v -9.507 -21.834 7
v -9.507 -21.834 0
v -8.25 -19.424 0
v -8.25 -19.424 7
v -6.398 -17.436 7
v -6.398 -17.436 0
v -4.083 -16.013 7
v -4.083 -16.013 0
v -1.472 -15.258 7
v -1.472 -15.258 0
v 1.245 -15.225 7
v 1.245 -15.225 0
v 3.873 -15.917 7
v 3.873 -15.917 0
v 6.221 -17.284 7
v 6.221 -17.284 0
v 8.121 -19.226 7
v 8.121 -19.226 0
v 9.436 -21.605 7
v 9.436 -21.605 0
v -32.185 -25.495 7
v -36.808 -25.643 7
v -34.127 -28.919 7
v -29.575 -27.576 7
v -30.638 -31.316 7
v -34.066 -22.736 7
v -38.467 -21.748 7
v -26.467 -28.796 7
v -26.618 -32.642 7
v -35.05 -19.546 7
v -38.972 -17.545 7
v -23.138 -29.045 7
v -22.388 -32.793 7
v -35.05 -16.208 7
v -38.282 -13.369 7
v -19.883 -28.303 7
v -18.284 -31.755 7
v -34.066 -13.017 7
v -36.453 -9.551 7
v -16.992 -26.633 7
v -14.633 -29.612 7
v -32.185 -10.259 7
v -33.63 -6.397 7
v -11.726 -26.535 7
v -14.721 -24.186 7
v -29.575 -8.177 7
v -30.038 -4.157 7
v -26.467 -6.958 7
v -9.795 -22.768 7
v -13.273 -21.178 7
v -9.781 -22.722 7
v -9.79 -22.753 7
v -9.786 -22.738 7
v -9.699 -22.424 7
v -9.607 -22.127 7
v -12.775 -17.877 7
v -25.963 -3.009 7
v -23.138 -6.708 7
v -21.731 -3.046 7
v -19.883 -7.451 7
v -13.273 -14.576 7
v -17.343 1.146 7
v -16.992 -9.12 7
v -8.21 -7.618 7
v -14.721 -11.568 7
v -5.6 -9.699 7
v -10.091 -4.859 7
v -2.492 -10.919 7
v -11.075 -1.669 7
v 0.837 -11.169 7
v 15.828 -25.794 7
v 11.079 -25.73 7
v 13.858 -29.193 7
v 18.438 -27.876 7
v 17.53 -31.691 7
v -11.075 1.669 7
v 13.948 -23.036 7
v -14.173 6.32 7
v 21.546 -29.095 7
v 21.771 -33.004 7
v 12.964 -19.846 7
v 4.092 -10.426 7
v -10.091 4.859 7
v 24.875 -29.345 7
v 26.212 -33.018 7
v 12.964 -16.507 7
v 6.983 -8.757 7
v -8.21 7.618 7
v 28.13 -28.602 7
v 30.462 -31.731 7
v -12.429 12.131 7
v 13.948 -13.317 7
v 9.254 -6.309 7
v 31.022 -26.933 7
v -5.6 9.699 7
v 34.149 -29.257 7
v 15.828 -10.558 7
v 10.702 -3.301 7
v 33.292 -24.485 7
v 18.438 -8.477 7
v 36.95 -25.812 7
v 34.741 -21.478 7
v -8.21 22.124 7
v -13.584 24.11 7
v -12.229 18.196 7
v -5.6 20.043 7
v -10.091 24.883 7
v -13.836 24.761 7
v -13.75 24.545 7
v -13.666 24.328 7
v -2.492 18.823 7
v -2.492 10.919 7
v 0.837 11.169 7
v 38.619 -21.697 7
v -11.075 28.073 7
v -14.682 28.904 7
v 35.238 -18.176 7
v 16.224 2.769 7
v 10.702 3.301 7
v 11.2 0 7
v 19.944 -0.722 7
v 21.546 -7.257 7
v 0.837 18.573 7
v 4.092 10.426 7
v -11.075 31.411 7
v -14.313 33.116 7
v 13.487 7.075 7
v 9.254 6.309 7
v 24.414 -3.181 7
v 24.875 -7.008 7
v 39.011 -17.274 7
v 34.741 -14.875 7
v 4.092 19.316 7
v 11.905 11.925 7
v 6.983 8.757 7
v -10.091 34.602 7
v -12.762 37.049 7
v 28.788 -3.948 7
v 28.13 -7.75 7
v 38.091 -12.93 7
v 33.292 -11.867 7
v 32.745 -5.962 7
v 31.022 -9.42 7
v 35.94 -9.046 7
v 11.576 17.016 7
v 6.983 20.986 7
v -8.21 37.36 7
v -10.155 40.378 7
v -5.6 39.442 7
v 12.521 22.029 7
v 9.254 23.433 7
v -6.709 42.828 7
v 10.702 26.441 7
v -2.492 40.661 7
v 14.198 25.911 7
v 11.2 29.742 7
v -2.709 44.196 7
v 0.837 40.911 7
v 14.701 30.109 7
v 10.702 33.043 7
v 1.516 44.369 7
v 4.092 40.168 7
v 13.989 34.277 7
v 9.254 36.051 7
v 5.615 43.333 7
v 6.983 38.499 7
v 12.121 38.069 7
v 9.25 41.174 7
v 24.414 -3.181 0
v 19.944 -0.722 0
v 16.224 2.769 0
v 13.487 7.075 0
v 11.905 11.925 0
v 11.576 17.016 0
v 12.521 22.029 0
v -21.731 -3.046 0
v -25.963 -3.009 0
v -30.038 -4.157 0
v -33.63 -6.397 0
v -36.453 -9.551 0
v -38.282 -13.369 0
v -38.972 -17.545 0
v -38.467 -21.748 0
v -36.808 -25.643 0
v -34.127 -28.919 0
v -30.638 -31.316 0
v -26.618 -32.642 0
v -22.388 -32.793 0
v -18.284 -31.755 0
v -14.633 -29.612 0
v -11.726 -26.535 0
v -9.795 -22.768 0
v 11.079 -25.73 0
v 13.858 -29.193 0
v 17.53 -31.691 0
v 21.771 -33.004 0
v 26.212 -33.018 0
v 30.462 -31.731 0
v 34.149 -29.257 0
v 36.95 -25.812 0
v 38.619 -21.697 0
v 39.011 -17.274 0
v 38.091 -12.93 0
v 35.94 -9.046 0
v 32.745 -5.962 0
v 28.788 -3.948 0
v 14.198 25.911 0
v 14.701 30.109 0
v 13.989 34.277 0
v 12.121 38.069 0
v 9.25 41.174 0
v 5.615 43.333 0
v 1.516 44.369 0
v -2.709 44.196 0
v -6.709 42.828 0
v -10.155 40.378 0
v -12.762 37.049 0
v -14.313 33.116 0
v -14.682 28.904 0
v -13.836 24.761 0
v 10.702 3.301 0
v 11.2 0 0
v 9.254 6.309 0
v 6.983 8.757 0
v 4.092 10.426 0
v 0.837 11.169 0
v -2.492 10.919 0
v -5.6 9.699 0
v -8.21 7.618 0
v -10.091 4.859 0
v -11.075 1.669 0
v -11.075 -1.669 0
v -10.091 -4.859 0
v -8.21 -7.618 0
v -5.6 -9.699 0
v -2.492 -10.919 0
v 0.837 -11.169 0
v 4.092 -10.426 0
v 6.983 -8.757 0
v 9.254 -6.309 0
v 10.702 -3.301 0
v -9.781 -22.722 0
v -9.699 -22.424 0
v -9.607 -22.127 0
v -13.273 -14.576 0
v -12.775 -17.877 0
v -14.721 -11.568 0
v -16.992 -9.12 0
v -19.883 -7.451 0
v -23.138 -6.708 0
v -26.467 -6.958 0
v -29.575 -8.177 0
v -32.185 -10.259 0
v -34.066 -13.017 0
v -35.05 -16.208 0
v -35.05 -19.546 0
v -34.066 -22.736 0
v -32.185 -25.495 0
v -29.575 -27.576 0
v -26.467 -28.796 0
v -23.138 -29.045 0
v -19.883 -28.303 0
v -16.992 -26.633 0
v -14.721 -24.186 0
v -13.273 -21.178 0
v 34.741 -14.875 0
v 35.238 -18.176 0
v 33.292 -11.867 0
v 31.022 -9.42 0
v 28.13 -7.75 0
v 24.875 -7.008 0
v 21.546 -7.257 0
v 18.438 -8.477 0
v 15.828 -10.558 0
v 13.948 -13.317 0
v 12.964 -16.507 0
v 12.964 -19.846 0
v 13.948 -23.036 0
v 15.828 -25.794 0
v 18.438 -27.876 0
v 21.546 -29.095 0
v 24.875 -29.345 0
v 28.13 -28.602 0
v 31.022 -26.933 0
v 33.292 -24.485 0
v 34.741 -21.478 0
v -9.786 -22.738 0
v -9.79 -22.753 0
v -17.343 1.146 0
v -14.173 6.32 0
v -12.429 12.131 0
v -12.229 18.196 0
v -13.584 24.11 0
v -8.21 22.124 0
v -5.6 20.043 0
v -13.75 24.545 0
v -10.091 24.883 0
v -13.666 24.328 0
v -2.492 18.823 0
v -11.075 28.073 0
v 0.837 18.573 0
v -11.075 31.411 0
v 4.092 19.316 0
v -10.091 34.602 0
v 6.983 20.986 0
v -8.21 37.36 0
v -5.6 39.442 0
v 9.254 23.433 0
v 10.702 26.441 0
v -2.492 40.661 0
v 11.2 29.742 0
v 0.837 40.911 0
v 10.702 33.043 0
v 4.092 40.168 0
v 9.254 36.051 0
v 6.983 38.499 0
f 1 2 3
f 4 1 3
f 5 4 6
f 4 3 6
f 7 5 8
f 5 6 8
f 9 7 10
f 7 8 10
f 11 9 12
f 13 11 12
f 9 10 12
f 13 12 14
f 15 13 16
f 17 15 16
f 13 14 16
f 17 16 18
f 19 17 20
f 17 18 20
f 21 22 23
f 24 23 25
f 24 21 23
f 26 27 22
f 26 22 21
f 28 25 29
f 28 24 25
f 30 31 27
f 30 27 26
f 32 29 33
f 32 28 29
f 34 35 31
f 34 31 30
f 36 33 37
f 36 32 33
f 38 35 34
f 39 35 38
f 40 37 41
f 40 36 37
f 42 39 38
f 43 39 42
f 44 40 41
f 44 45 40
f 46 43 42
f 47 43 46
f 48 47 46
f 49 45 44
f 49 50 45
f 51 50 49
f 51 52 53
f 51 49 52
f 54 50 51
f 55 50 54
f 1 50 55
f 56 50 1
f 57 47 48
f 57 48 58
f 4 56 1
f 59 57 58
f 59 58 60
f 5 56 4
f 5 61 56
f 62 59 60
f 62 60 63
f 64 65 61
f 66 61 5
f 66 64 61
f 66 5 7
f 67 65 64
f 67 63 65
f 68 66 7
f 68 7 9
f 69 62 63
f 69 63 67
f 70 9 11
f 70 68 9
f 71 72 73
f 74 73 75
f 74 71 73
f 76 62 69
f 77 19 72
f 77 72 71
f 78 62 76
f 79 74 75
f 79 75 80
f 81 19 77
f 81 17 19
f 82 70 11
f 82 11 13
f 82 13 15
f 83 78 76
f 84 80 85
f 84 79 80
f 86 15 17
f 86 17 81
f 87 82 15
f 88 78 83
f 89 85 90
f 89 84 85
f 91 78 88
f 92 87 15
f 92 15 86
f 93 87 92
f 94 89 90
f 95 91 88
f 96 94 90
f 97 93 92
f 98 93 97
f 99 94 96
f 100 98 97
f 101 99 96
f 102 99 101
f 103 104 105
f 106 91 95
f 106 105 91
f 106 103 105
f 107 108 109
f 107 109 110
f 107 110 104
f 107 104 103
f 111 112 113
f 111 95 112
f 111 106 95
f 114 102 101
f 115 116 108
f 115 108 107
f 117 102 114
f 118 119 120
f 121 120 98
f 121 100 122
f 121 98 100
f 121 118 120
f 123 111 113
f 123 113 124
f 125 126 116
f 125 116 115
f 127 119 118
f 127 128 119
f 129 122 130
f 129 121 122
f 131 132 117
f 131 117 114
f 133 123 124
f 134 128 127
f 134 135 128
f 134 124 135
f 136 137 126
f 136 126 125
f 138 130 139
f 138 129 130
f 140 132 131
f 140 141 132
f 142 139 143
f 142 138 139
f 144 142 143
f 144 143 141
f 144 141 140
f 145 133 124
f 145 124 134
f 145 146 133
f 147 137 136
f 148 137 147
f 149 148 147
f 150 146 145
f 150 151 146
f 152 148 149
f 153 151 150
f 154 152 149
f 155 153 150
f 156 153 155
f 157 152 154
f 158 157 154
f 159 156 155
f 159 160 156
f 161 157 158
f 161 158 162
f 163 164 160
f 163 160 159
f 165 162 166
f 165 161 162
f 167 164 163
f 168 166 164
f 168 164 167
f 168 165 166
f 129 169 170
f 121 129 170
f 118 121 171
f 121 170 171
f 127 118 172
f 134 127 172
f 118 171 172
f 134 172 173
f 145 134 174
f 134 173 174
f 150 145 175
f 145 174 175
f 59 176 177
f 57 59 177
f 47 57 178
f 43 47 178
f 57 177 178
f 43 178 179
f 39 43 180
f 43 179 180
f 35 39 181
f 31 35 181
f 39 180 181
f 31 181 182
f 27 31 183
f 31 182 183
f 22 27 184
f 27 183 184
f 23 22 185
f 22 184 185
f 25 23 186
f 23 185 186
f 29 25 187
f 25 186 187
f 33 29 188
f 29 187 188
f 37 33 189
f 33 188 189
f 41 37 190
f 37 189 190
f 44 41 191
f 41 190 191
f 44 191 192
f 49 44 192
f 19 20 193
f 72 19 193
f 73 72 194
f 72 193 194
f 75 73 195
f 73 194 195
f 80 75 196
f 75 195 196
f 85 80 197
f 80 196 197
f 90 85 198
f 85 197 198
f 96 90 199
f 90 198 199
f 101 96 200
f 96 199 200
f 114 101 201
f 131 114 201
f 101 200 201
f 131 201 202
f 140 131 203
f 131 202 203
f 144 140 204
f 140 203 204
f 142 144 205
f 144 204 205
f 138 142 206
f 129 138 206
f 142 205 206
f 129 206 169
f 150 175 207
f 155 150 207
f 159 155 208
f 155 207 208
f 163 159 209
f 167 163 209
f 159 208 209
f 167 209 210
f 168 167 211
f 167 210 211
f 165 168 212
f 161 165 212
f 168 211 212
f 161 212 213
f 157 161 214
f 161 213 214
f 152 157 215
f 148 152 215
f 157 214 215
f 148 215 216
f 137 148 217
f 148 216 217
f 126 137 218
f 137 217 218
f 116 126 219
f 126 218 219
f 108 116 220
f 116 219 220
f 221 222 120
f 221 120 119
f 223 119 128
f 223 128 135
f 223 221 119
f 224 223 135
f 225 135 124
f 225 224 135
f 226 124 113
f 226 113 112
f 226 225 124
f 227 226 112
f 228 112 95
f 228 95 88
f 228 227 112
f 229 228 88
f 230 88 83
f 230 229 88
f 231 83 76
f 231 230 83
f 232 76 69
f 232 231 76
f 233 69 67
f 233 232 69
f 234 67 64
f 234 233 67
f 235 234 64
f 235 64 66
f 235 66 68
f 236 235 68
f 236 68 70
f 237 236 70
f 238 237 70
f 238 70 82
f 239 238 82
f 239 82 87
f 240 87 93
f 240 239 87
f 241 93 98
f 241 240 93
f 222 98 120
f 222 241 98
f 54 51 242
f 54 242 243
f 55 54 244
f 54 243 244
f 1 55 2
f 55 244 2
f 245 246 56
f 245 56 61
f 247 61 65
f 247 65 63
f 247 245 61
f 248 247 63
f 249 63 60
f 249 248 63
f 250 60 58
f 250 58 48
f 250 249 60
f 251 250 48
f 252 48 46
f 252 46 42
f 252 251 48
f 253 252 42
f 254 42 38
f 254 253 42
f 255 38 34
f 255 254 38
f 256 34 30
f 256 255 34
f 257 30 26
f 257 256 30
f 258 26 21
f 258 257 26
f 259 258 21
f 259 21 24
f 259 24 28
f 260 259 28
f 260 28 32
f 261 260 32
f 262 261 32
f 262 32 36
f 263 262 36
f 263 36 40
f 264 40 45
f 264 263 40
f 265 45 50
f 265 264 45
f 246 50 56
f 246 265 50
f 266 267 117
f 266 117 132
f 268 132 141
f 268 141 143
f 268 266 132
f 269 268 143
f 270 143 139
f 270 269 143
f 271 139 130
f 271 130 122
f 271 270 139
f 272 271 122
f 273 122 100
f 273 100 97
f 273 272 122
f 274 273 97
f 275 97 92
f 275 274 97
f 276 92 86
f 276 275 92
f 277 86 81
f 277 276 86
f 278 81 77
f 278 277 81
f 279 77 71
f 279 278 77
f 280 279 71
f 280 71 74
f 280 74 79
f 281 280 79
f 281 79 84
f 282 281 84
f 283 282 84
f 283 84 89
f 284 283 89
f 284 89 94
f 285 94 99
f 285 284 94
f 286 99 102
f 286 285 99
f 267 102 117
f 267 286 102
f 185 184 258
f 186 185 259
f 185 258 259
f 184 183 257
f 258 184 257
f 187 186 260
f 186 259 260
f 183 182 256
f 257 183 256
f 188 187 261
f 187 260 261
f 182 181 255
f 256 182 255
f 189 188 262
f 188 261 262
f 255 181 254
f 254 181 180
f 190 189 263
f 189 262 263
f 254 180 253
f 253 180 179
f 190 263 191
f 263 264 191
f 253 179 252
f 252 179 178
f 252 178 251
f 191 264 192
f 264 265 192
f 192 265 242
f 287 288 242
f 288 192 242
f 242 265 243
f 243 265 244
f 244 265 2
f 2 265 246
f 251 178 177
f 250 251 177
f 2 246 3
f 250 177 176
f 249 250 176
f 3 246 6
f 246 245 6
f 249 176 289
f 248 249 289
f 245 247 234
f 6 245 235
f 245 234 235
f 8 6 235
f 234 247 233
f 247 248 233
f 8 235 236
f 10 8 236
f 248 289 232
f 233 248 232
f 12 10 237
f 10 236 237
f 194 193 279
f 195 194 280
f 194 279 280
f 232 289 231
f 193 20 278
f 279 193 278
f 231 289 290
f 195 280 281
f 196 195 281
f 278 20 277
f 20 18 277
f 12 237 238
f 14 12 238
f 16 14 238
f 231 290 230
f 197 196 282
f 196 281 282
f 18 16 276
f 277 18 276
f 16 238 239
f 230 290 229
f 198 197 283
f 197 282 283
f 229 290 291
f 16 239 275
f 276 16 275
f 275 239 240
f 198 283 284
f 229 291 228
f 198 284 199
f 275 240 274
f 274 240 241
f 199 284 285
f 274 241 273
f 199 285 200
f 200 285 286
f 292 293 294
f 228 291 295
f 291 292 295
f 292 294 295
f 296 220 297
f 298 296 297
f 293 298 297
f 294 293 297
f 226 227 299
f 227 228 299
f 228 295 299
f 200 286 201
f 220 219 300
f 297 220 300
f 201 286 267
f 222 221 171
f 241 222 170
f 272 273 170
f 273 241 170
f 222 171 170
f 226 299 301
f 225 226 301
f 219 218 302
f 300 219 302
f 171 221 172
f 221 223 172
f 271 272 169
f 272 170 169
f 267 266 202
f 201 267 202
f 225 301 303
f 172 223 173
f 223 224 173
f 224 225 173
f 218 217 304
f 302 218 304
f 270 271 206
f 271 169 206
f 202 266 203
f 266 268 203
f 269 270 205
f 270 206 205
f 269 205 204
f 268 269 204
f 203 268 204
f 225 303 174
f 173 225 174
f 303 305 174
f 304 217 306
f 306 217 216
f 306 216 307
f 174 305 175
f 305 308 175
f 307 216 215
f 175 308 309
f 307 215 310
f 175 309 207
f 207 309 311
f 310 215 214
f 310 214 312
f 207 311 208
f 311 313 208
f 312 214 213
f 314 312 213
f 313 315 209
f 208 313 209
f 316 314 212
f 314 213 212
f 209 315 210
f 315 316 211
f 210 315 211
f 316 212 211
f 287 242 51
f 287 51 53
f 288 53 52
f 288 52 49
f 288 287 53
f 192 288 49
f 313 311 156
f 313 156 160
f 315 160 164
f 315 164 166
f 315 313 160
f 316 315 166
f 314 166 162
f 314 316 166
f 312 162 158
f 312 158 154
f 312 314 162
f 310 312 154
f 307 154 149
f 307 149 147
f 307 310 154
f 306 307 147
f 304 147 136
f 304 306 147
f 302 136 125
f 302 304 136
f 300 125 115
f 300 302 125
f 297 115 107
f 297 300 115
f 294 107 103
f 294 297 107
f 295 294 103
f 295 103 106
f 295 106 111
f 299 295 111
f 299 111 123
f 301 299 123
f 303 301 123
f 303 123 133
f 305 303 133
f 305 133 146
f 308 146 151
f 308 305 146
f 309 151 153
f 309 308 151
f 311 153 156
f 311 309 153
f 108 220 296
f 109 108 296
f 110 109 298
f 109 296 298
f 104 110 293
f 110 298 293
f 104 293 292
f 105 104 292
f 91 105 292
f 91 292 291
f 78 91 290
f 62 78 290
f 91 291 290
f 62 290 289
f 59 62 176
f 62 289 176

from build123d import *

# Parameters (mm, degrees)
F0_R        = 11.2
F1_DEPTH    = 7
F2_T1_DEPTH = 7.3091738438


# Not quite as in the source:
# - a fillet or chamfer that OpenCascade refuses, or shapes differently, is made with other operations: its cross-section is extruded or revolved along the edge and cut away or added


with BuildPart() as f1:
    # F0 (on Top) → F1 (new body)
    with BuildSketch(Plane.XY):
        with BuildLine():
            ThreePointArc((24.4140649416, -3.1809629834), (13.4871120811, 7.0747385166), (12.5205974964, 22.0294555527))
            ThreePointArc((12.5205974964, 22.0294555527), (1.5158634118, 44.3693332806), (-13.8361222225, 24.7608951415))
            ThreePointArc((-13.8361222225, 24.7608951415), (-13.7078172482, 24.4365570296), (-13.5843298249, 24.1103542803))
            ThreePointArc((-13.5843298249, 24.1103542803), (-13.113174784, 9.1691492017), (-21.7305353918, -3.0457061978))
            ThreePointArc((-21.7305353918, -3.0457061978), (-36.801707194, -25.6538021325), (-9.7868965809, -22.7441236587))
            ThreePointArc((-9.7868965809, -22.7441236587), (-9.6574780237, -22.2857276707), (-9.506618108, -21.8339342105))
            ThreePointArc((-9.506618108, -21.8339342105), (-0.1149775919, -15.1499512762), (9.4355546579, -21.6048620576))
            ThreePointArc((9.4355546579, -21.6048620576), (35.6773528954, -27.6386082592), (24.4140649416, -3.1809629834))
        make_face()
        with Locations((-23.9752419293, -17.876798287)):
            Circle(F0_R, mode=Mode.SUBTRACT)
        Circle(F0_R, mode=Mode.SUBTRACT)
        with Locations((24.0384545177, -18.176259473)):
            Circle(F0_R, mode=Mode.SUBTRACT)
        with Locations((0, 29.7421794385)):
            Circle(F0_R, mode=Mode.SUBTRACT)
    extrude(amount=F1_DEPTH)

    # F2: fillet of radius 1.5 on 1 edges, made by hand

    # F2_s2 → F2_t1 (cut)
    with BuildSketch(Plane.XY.offset(-0.1545869219)):
        with BuildLine():
            ThreePointArc((-9.7727399665, -22.6912544357), (-9.7886409139, -22.7473067601), (-9.8067032425, -22.8027004014))
            Line((-9.8067032425, -22.8027004014), (-9.6647949432, -22.8520369213))
            ThreePointArc((-9.6647949432, -22.8520369213), (-9.6549491563, -22.8224010768), (-9.6447861139, -22.7928747896))
            Line((-9.6447861139, -22.7928747896), (-9.6413873814, -22.7815286112))
            ThreePointArc((-9.6413873814, -22.7815286112), (-9.6346402283, -22.7554279828), (-9.6274353396, -22.7294463591))
            Line((-9.6274353396, -22.7294463591), (-9.7727399665, -22.6912544357))
        make_face()
    extrude(amount=F2_T1_DEPTH, mode=Mode.SUBTRACT)


solid = f1.part
